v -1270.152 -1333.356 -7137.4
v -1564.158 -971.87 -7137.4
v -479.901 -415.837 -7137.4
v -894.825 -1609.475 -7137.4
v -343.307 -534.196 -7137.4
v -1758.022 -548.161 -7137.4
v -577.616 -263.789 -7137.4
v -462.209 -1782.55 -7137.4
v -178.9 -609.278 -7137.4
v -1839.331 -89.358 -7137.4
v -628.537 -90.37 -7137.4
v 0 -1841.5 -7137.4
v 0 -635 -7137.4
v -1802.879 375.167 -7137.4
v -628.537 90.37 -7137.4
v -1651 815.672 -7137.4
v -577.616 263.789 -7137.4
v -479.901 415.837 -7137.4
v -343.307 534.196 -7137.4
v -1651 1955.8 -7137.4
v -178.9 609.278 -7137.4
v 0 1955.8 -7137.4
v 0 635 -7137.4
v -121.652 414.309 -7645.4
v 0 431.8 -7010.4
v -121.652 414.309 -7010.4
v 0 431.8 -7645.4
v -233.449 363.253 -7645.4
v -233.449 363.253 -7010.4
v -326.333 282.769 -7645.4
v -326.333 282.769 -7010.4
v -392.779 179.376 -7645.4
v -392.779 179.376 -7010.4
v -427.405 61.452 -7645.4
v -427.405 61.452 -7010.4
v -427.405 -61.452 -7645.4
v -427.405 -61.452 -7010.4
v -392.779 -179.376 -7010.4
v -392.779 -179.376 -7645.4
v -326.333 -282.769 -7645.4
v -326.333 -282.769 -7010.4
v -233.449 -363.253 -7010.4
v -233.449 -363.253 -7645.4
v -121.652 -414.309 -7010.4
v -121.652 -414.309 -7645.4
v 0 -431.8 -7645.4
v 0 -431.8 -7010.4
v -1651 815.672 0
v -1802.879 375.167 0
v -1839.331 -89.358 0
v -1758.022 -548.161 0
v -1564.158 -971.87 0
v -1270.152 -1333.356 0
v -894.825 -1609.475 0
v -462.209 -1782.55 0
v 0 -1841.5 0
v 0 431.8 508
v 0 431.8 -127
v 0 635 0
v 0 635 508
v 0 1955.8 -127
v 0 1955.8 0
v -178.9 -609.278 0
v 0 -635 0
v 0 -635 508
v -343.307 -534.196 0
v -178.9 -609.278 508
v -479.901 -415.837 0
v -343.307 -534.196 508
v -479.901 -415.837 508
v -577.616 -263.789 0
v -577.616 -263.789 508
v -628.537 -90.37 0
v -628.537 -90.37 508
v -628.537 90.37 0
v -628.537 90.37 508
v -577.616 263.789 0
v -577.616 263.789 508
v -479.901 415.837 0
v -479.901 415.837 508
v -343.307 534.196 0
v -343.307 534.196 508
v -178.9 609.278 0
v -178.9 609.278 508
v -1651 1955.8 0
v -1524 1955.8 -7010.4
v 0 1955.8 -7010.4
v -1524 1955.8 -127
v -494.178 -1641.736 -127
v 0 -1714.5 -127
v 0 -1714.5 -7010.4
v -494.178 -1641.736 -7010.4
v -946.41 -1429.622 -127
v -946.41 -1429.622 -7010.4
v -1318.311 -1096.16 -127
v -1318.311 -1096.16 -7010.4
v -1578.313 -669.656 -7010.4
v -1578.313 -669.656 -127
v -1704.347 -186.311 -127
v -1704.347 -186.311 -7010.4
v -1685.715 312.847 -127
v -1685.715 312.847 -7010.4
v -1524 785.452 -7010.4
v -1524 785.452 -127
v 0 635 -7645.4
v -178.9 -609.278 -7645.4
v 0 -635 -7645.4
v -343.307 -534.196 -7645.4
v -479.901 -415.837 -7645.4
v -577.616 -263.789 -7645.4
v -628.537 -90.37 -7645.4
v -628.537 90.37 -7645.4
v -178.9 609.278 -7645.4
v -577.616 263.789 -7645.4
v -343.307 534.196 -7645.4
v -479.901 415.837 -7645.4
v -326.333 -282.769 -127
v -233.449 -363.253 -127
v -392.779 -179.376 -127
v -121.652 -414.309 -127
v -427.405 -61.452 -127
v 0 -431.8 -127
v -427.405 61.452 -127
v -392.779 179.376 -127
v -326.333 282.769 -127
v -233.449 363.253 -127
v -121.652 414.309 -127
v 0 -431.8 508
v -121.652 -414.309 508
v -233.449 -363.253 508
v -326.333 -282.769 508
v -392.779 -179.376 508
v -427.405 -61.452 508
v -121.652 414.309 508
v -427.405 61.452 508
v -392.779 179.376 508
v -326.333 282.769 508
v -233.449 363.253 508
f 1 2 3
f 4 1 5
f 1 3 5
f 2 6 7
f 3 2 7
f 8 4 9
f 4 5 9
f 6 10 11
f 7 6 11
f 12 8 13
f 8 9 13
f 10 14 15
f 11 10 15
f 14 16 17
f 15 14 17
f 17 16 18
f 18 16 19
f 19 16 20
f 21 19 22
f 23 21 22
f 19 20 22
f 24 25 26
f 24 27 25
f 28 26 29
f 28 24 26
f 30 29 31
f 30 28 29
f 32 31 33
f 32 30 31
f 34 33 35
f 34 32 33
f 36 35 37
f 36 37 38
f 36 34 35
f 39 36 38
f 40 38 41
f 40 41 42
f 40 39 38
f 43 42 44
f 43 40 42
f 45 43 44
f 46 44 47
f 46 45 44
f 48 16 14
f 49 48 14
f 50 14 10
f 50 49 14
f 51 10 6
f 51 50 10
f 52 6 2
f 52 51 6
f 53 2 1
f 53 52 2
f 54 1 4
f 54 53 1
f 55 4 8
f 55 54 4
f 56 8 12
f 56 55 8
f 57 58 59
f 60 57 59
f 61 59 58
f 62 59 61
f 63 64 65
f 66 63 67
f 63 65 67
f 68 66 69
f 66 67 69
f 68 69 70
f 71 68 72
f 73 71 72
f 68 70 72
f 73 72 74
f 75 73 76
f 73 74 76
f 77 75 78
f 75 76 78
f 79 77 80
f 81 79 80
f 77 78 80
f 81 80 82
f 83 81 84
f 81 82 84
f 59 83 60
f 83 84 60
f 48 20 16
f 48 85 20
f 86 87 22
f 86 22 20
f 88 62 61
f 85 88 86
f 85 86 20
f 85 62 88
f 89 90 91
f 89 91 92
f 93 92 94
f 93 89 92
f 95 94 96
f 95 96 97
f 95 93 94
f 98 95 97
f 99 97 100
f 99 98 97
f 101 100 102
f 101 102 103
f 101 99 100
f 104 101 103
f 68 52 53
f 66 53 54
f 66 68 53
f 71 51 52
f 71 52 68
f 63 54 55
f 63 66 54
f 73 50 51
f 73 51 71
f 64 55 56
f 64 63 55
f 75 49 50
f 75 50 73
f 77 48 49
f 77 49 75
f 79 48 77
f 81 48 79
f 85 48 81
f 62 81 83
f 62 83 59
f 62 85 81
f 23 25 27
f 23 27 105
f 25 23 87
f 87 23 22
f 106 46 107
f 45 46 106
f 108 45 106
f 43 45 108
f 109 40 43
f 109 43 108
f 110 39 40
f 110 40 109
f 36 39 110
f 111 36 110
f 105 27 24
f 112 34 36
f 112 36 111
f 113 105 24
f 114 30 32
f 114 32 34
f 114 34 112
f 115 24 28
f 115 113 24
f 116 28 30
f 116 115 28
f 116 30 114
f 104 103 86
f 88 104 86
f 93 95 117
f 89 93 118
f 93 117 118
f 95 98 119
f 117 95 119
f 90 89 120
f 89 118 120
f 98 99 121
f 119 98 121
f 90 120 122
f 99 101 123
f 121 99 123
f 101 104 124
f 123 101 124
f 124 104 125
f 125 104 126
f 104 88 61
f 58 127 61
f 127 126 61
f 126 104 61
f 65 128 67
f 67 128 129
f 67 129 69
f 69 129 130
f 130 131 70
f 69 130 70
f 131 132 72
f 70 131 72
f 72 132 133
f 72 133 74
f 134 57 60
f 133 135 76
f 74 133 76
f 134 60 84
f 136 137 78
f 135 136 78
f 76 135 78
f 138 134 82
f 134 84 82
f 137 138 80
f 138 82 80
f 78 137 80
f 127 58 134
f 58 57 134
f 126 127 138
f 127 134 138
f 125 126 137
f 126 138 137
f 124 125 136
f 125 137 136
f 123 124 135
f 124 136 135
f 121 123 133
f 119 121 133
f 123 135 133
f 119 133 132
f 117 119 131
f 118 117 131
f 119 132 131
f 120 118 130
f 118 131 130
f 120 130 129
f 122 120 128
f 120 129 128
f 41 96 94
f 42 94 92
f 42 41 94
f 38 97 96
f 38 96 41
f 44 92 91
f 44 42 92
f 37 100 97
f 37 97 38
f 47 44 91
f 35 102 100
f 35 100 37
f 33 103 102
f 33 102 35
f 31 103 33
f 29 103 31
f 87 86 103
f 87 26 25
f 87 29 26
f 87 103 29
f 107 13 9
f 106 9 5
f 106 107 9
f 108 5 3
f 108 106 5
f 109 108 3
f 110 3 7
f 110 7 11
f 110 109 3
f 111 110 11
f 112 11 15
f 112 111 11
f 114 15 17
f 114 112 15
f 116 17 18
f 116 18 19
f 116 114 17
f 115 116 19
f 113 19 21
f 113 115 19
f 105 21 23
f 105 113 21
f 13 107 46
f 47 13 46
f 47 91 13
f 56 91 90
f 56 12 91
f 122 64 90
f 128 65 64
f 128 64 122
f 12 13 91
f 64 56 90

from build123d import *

# Parameters (mm, degrees)
BOSS_EXTRUDE1_DEPTH      = 508
BOSS_EXTRUDE1_DEPTH_BACK = 127
BOSS_EXTRUDE2_DEPTH      = 127
BOSS_EXTRUDE3_DEPTH      = 6883.4


with BuildPart() as part:
    # Sketch1 → Boss-Extrude1 (new body, two sides)
    with BuildSketch(Plane.XY) as boss_extrude1_sk:
        with BuildLine():
            Line((0, 635), (0, 431.8))
            ThreePointArc((0, 431.8), (-431.8, 0), (0, -431.8))
            Line((0, -431.8), (0, -635))
            ThreePointArc((0, -635), (-635, 0), (0, 635))
        make_face()
    extrude(amount=BOSS_EXTRUDE1_DEPTH)
    extrude(boss_extrude1_sk.sketch, amount=-BOSS_EXTRUDE1_DEPTH_BACK)

    # Sketch2 → Boss-Extrude2 (add)
    with BuildSketch(Plane.XY):
        with BuildLine():
            Line((0, 635), (0, 1955.8))
            Line((0, 1955.8), (-1651, 1955.8))
            Line((-1651, 1955.8), (-1651, 815.672268745))
            ThreePointArc((-1651, 815.672268745), (-1564.158357216, -971.869787344), (0, -1841.5))
            Line((0, -1841.5), (0, -635))
            ThreePointArc((0, -635), (-635, 0), (0, 635))
        make_face()
    extrude(amount=-BOSS_EXTRUDE2_DEPTH)


with BuildPart() as body_2:
    # Mirror1: mirrored copy
    add(part.part.mirror(Plane.XY.offset(-3568.7)))


with BuildPart() as part_1:
    add(part.part)

    add(body_2.part)  # Boss-Extrude3 merges body 2
    # Sketch3 → Boss-Extrude3 (add)
    with BuildSketch(Plane(origin=(0, 0, -127), x_dir=(-1, 0, 0), z_dir=(0, 0, -1))):
        with BuildLine():
            Line((1651, 1955.8), (1651, 815.672268745))
            ThreePointArc((1651, 815.672268745), (1564.158357216, -971.869787344), (0, -1841.5))
            Line((0, -1841.5), (0, -1714.5))
            ThreePointArc((0, -1714.5), (1463.92743252, -892.42743252), (1524, 785.45162168))
            Line((1524, 785.45162168), (1524, 1955.8))
            Line((1524, 1955.8), (1651, 1955.8))
        make_face()
    extrude(amount=BOSS_EXTRUDE3_DEPTH)


solid = part_1.part
